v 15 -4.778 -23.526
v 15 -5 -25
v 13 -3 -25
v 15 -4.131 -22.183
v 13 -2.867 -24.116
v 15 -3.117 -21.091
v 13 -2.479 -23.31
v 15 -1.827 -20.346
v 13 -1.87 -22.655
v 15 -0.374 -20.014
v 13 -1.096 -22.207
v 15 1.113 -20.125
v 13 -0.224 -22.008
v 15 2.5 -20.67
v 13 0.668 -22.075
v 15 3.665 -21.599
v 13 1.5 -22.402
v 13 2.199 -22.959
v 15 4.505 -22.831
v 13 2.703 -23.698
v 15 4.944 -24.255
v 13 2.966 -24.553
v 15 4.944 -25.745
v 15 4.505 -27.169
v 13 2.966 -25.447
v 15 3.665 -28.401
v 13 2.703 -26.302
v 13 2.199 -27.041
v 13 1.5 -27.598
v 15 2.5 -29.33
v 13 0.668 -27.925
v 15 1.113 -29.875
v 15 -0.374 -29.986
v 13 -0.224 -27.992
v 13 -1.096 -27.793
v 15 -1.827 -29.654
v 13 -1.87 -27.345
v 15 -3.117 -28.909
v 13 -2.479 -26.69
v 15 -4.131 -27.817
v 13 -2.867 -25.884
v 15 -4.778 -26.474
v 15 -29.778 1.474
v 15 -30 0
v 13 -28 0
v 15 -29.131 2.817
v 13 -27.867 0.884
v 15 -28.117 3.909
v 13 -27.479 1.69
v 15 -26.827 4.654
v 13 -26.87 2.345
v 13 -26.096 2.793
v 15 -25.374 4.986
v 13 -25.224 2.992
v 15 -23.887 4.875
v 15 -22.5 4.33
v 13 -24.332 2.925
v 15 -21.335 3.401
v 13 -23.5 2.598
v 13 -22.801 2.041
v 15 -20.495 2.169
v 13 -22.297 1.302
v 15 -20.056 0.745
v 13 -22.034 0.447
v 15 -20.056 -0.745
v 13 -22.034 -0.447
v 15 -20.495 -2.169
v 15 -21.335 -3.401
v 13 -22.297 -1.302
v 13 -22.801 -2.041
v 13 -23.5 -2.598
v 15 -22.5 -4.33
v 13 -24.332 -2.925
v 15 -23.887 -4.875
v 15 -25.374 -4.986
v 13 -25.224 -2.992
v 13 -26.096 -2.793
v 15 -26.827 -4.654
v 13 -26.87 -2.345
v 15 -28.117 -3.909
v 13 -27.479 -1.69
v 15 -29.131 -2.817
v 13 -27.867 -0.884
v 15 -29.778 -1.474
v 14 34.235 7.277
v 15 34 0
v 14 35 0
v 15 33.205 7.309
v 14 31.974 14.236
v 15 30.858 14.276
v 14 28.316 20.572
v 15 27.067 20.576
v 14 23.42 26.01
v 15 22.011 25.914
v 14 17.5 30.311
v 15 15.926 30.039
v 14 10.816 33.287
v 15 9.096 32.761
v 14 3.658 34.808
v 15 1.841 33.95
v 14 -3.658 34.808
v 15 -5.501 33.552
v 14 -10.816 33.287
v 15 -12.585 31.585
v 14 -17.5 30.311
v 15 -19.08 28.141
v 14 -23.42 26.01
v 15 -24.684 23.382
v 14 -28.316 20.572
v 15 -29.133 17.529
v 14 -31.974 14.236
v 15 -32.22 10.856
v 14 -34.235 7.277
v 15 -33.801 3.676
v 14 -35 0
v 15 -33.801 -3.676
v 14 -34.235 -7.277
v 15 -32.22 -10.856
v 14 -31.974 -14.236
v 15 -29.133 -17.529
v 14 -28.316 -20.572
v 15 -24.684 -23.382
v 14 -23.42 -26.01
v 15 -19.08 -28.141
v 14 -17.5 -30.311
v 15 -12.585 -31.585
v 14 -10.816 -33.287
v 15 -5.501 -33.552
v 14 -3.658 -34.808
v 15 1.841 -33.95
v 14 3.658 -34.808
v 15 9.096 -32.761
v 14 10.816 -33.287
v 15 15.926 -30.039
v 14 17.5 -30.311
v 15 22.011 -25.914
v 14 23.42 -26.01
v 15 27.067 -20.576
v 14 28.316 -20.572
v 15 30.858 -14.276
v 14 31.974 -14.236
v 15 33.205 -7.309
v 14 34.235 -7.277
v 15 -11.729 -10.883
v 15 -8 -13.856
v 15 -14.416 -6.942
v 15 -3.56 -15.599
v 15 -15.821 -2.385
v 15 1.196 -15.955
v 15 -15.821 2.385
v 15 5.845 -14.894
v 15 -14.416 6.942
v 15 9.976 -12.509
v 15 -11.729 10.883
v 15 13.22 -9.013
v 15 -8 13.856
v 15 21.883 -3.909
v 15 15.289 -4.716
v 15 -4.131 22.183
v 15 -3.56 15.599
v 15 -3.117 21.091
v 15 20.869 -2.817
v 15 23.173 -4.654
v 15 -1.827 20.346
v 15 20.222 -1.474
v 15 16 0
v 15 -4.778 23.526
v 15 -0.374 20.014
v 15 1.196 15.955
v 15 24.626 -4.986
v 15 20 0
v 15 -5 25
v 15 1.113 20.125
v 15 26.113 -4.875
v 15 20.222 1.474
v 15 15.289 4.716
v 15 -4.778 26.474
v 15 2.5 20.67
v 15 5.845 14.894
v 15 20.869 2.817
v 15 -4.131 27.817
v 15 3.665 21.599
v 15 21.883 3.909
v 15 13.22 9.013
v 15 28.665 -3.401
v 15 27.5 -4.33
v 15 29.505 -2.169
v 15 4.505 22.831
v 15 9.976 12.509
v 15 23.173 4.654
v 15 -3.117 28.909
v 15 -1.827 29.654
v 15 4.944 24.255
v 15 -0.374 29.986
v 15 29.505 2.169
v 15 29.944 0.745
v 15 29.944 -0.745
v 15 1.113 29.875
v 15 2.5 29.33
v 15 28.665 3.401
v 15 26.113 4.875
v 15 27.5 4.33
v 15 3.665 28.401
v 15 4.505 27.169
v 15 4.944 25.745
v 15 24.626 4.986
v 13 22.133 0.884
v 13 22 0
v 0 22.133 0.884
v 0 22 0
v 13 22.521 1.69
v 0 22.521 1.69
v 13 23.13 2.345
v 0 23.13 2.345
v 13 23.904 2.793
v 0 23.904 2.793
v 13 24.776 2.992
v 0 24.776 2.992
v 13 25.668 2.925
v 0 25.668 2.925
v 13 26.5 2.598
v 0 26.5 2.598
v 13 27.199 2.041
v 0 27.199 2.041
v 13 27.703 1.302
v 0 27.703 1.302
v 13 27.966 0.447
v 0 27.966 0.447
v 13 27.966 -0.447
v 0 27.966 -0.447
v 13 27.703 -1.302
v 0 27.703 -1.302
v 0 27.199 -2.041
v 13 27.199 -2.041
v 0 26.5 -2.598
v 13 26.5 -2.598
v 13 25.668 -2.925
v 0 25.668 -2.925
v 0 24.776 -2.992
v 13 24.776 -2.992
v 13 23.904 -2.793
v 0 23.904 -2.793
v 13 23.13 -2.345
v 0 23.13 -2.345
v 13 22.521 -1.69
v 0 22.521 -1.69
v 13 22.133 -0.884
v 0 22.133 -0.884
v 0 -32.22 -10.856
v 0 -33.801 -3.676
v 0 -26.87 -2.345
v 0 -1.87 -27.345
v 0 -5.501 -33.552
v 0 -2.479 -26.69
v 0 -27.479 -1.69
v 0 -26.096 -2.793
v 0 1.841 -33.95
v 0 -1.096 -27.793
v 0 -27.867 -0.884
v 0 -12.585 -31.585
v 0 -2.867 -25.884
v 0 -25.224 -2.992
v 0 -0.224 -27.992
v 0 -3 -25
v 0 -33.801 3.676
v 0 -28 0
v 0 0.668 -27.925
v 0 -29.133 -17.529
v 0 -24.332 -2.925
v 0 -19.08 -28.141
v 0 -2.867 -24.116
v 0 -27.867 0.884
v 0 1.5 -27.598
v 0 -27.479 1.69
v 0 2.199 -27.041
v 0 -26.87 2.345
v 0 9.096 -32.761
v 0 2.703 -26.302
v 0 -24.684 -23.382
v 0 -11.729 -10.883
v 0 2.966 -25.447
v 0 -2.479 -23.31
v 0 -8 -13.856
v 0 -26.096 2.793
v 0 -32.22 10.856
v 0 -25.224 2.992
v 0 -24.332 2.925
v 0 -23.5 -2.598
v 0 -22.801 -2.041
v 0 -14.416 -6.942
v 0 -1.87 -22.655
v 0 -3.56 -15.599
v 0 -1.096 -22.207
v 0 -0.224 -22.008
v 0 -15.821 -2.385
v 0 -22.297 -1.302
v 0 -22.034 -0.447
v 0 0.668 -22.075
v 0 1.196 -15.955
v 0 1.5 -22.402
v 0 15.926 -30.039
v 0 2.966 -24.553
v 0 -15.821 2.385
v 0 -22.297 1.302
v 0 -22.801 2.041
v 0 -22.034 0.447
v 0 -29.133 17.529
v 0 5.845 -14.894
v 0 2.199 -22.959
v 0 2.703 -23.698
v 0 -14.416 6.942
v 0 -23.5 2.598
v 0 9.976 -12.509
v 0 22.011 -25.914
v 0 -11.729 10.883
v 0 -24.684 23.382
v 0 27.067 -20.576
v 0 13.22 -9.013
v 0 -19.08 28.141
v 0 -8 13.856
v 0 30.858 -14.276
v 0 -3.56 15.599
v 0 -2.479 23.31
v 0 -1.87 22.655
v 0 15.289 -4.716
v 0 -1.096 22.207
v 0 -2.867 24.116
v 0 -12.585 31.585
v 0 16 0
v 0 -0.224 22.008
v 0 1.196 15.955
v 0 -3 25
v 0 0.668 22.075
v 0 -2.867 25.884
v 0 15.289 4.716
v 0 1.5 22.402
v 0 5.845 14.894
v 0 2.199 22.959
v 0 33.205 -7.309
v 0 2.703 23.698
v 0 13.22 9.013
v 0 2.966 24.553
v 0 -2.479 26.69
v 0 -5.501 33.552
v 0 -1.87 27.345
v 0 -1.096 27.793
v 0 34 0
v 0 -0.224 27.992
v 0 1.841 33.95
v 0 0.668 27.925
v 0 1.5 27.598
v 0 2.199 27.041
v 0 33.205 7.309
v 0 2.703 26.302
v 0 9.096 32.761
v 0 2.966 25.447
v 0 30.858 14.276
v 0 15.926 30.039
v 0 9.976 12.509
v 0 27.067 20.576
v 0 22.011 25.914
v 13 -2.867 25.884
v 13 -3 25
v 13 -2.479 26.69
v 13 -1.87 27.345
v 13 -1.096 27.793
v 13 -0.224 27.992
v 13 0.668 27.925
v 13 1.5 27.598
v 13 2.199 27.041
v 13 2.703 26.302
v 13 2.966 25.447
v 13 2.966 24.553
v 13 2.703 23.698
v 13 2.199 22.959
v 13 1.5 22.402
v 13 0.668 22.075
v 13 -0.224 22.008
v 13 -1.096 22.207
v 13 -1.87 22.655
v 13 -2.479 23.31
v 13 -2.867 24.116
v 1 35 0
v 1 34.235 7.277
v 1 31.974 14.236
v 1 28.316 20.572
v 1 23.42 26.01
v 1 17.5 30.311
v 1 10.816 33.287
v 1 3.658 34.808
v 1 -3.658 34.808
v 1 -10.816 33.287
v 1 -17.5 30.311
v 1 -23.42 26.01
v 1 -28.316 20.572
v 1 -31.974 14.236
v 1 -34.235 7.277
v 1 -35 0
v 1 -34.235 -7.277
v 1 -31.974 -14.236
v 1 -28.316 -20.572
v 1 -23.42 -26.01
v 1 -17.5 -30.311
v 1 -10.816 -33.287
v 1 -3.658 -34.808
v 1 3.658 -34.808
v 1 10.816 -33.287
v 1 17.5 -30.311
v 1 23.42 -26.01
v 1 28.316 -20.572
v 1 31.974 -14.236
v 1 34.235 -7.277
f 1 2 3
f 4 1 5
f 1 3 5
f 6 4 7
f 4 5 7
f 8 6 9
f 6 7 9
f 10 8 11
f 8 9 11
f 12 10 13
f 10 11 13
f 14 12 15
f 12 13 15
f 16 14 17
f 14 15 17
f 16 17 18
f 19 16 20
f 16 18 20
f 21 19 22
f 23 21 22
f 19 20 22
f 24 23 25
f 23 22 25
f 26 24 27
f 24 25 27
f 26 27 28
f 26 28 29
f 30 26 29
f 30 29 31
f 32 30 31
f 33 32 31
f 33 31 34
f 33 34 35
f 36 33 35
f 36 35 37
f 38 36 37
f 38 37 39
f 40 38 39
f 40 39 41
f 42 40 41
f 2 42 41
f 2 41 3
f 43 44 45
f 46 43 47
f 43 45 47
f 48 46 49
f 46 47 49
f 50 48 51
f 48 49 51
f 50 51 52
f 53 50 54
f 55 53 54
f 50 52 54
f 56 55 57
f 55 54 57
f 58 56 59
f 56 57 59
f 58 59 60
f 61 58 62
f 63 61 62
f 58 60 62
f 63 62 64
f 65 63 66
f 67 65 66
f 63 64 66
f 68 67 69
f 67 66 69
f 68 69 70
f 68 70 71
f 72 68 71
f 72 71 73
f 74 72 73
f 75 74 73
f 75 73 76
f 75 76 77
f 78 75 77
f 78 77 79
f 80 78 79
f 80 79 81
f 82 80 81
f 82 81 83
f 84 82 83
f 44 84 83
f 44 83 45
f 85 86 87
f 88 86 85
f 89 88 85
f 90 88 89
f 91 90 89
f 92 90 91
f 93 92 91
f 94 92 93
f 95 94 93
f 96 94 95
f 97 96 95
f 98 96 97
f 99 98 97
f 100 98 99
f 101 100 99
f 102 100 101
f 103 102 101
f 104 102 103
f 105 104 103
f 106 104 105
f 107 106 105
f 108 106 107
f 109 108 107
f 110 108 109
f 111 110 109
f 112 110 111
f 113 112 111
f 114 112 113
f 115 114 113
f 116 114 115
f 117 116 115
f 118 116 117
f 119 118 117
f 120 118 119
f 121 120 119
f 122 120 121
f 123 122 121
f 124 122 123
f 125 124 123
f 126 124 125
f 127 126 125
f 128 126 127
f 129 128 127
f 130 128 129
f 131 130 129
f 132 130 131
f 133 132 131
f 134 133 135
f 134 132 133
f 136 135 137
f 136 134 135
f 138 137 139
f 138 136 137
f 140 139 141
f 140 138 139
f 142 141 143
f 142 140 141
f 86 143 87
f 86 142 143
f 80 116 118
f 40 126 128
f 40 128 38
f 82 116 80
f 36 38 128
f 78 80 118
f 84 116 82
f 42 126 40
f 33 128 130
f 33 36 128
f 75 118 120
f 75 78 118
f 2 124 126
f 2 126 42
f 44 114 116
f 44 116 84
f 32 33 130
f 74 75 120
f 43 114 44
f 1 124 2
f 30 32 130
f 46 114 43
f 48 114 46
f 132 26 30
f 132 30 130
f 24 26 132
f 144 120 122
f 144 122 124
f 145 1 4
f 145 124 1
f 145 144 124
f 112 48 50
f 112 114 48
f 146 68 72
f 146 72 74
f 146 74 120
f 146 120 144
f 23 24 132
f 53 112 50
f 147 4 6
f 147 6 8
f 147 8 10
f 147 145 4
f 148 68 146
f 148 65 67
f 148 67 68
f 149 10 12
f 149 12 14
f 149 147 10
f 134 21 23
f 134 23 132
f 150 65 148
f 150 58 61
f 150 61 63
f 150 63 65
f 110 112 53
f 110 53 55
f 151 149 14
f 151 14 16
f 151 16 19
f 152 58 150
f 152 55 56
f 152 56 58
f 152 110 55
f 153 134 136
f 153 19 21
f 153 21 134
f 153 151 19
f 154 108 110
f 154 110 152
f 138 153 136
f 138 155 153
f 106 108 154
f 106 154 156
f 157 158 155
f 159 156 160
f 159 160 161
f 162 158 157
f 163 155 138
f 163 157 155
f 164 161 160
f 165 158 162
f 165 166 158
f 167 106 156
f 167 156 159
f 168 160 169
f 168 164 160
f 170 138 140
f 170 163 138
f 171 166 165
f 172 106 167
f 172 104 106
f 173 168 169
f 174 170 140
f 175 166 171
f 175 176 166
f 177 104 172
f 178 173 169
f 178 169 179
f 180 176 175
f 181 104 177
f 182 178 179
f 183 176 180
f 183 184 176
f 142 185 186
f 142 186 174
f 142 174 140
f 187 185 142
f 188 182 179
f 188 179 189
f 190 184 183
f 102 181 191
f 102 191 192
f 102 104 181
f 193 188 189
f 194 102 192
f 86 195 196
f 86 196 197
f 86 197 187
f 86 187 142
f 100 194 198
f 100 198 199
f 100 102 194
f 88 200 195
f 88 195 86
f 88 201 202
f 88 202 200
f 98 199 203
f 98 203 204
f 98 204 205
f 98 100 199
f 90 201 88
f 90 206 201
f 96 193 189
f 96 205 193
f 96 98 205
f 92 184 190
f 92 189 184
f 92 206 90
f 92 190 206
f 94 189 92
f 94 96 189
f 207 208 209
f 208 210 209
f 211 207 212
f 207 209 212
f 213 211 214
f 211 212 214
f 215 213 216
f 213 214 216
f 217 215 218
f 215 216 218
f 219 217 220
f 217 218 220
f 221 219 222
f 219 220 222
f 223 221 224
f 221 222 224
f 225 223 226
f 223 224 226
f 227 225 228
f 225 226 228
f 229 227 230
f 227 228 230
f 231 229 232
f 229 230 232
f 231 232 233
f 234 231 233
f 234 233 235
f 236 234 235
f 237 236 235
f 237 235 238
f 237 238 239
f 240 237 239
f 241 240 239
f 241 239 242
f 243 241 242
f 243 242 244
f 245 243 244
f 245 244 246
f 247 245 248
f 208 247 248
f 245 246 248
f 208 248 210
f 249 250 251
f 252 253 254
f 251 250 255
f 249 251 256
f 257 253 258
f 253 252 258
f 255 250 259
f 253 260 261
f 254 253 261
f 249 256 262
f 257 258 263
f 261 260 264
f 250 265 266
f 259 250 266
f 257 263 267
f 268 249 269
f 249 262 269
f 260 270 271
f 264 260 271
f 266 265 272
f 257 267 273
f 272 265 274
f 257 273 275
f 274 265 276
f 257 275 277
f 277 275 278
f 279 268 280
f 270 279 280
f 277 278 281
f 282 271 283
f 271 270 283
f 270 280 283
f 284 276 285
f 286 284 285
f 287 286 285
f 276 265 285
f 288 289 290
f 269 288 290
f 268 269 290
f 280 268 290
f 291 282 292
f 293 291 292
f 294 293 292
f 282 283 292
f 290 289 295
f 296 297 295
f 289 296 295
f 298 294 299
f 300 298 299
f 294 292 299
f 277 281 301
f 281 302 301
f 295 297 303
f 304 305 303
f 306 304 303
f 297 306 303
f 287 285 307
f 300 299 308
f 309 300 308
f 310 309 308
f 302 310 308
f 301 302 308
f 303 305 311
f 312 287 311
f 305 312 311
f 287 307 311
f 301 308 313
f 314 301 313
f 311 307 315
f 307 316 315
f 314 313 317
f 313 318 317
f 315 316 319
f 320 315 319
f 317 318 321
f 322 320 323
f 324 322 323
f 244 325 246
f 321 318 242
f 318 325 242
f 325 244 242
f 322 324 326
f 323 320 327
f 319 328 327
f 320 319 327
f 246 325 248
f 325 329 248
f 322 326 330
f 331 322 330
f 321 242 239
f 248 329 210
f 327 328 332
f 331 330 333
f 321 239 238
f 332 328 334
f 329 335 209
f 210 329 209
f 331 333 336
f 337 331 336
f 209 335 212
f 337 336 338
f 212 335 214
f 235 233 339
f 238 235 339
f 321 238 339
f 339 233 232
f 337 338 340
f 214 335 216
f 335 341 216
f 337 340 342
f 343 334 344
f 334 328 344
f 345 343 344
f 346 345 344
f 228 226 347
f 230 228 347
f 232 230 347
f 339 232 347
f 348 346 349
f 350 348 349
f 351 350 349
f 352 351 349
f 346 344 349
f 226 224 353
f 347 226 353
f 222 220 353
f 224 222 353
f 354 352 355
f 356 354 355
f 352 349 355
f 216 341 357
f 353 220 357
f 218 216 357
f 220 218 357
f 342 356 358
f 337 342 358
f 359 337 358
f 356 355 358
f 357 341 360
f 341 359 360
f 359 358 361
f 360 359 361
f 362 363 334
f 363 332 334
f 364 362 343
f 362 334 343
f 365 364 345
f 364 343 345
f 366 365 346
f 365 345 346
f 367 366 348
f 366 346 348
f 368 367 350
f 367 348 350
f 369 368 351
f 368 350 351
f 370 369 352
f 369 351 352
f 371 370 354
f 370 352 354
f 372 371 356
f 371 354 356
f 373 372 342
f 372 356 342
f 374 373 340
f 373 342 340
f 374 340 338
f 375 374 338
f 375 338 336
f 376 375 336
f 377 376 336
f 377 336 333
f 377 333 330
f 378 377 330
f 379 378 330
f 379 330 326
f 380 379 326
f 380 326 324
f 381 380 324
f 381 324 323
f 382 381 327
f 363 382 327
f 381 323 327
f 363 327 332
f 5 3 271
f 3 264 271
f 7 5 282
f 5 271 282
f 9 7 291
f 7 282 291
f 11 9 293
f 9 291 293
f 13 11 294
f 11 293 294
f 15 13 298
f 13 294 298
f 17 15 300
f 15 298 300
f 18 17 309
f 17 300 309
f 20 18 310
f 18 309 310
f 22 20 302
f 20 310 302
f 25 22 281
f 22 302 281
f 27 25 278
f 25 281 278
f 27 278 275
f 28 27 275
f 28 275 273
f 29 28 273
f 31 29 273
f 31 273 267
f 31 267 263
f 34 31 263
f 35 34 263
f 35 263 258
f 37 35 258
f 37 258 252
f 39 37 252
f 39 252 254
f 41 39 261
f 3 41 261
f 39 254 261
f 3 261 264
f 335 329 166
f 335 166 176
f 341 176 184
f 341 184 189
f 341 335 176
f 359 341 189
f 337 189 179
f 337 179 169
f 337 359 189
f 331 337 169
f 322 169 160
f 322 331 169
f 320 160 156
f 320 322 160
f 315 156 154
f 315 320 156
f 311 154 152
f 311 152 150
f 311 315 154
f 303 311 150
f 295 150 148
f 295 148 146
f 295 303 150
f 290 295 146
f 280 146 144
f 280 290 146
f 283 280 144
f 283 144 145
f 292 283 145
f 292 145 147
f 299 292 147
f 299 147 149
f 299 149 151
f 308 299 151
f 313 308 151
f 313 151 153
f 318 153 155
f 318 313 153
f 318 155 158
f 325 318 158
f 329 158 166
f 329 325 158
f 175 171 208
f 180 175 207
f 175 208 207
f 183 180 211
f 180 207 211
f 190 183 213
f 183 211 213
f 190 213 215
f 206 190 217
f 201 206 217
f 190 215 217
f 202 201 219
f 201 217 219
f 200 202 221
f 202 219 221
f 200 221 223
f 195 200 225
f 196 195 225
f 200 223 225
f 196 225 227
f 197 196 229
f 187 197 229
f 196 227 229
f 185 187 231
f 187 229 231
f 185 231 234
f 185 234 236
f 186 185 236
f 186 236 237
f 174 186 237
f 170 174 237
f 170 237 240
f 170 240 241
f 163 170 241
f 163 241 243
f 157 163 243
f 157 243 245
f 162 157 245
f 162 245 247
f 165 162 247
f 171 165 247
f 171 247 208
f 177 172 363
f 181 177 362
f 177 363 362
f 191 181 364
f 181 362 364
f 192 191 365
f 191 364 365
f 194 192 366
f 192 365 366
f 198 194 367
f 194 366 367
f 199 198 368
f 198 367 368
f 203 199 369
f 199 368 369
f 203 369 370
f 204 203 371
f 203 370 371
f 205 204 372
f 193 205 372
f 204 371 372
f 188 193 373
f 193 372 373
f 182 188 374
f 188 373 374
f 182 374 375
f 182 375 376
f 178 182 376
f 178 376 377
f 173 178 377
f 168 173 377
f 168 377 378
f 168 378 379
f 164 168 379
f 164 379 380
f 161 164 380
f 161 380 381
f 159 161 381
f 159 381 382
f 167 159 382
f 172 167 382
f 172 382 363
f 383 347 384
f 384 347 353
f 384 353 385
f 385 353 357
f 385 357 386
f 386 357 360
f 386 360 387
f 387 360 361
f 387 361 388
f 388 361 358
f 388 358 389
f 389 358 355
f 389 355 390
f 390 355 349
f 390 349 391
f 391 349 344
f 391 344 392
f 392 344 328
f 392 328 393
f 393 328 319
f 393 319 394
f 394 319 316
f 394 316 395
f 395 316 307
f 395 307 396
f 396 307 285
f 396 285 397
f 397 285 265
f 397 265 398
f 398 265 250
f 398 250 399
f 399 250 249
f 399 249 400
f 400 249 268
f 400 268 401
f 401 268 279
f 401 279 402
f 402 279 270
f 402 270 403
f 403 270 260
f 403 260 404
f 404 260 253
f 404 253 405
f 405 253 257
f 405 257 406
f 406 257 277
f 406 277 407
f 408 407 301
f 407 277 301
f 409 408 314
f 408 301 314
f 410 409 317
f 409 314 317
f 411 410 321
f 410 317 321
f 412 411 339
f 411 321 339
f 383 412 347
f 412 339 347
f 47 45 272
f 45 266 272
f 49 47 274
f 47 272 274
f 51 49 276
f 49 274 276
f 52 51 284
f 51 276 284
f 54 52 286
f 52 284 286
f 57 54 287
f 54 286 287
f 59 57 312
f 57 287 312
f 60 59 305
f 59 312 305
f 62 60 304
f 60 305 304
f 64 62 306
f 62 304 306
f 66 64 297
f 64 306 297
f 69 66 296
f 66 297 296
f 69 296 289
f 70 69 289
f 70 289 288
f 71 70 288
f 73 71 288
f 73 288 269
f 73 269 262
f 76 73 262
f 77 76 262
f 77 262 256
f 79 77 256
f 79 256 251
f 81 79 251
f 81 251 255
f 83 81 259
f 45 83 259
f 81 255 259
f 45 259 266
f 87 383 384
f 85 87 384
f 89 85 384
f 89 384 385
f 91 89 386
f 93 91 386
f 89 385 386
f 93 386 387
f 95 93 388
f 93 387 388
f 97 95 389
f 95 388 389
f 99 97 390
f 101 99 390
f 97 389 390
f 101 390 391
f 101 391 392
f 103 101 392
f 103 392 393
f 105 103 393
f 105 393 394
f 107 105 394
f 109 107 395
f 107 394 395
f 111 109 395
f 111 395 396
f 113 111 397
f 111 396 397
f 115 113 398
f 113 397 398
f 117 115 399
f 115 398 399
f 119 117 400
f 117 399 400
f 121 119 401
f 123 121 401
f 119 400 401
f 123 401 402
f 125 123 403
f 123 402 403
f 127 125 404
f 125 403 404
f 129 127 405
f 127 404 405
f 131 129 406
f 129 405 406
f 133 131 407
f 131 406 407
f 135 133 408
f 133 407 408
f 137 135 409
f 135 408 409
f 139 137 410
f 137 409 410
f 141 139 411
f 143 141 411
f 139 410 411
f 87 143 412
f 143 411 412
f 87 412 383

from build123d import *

# Parameters (mm, degrees)
F0_R           = 35
F0_R_2         = 16
F1_DEPTH       = 15
F2_SIZE        = 1
F4_D           = 6
F4_CSINK_D     = 10
F4_CSINK_ANGLE = 90


with BuildPart() as f1:
    # F0 (on Right) → F1 (new body)
    with BuildSketch(Plane.YZ):
        Circle(F0_R)
        Circle(F0_R_2, mode=Mode.SUBTRACT)
    extrude(amount=F1_DEPTH)

    # F2
    f2_edges = [f1.edges().sort_by_distance(p)[0] for p in [
        (15, -35, 0),
        (0, -35, 0),
    ]]
    chamfer(f2_edges, length=F2_SIZE)

    # F4 (through all)
    with Locations(Plane.YZ.offset(15)):
        with Locations((0, 25), (-25, 0), (25, 0), (0, -25)):
            CounterSinkHole(F4_D / 2, F4_CSINK_D / 2, counter_sink_angle=F4_CSINK_ANGLE)


solid = f1.part
